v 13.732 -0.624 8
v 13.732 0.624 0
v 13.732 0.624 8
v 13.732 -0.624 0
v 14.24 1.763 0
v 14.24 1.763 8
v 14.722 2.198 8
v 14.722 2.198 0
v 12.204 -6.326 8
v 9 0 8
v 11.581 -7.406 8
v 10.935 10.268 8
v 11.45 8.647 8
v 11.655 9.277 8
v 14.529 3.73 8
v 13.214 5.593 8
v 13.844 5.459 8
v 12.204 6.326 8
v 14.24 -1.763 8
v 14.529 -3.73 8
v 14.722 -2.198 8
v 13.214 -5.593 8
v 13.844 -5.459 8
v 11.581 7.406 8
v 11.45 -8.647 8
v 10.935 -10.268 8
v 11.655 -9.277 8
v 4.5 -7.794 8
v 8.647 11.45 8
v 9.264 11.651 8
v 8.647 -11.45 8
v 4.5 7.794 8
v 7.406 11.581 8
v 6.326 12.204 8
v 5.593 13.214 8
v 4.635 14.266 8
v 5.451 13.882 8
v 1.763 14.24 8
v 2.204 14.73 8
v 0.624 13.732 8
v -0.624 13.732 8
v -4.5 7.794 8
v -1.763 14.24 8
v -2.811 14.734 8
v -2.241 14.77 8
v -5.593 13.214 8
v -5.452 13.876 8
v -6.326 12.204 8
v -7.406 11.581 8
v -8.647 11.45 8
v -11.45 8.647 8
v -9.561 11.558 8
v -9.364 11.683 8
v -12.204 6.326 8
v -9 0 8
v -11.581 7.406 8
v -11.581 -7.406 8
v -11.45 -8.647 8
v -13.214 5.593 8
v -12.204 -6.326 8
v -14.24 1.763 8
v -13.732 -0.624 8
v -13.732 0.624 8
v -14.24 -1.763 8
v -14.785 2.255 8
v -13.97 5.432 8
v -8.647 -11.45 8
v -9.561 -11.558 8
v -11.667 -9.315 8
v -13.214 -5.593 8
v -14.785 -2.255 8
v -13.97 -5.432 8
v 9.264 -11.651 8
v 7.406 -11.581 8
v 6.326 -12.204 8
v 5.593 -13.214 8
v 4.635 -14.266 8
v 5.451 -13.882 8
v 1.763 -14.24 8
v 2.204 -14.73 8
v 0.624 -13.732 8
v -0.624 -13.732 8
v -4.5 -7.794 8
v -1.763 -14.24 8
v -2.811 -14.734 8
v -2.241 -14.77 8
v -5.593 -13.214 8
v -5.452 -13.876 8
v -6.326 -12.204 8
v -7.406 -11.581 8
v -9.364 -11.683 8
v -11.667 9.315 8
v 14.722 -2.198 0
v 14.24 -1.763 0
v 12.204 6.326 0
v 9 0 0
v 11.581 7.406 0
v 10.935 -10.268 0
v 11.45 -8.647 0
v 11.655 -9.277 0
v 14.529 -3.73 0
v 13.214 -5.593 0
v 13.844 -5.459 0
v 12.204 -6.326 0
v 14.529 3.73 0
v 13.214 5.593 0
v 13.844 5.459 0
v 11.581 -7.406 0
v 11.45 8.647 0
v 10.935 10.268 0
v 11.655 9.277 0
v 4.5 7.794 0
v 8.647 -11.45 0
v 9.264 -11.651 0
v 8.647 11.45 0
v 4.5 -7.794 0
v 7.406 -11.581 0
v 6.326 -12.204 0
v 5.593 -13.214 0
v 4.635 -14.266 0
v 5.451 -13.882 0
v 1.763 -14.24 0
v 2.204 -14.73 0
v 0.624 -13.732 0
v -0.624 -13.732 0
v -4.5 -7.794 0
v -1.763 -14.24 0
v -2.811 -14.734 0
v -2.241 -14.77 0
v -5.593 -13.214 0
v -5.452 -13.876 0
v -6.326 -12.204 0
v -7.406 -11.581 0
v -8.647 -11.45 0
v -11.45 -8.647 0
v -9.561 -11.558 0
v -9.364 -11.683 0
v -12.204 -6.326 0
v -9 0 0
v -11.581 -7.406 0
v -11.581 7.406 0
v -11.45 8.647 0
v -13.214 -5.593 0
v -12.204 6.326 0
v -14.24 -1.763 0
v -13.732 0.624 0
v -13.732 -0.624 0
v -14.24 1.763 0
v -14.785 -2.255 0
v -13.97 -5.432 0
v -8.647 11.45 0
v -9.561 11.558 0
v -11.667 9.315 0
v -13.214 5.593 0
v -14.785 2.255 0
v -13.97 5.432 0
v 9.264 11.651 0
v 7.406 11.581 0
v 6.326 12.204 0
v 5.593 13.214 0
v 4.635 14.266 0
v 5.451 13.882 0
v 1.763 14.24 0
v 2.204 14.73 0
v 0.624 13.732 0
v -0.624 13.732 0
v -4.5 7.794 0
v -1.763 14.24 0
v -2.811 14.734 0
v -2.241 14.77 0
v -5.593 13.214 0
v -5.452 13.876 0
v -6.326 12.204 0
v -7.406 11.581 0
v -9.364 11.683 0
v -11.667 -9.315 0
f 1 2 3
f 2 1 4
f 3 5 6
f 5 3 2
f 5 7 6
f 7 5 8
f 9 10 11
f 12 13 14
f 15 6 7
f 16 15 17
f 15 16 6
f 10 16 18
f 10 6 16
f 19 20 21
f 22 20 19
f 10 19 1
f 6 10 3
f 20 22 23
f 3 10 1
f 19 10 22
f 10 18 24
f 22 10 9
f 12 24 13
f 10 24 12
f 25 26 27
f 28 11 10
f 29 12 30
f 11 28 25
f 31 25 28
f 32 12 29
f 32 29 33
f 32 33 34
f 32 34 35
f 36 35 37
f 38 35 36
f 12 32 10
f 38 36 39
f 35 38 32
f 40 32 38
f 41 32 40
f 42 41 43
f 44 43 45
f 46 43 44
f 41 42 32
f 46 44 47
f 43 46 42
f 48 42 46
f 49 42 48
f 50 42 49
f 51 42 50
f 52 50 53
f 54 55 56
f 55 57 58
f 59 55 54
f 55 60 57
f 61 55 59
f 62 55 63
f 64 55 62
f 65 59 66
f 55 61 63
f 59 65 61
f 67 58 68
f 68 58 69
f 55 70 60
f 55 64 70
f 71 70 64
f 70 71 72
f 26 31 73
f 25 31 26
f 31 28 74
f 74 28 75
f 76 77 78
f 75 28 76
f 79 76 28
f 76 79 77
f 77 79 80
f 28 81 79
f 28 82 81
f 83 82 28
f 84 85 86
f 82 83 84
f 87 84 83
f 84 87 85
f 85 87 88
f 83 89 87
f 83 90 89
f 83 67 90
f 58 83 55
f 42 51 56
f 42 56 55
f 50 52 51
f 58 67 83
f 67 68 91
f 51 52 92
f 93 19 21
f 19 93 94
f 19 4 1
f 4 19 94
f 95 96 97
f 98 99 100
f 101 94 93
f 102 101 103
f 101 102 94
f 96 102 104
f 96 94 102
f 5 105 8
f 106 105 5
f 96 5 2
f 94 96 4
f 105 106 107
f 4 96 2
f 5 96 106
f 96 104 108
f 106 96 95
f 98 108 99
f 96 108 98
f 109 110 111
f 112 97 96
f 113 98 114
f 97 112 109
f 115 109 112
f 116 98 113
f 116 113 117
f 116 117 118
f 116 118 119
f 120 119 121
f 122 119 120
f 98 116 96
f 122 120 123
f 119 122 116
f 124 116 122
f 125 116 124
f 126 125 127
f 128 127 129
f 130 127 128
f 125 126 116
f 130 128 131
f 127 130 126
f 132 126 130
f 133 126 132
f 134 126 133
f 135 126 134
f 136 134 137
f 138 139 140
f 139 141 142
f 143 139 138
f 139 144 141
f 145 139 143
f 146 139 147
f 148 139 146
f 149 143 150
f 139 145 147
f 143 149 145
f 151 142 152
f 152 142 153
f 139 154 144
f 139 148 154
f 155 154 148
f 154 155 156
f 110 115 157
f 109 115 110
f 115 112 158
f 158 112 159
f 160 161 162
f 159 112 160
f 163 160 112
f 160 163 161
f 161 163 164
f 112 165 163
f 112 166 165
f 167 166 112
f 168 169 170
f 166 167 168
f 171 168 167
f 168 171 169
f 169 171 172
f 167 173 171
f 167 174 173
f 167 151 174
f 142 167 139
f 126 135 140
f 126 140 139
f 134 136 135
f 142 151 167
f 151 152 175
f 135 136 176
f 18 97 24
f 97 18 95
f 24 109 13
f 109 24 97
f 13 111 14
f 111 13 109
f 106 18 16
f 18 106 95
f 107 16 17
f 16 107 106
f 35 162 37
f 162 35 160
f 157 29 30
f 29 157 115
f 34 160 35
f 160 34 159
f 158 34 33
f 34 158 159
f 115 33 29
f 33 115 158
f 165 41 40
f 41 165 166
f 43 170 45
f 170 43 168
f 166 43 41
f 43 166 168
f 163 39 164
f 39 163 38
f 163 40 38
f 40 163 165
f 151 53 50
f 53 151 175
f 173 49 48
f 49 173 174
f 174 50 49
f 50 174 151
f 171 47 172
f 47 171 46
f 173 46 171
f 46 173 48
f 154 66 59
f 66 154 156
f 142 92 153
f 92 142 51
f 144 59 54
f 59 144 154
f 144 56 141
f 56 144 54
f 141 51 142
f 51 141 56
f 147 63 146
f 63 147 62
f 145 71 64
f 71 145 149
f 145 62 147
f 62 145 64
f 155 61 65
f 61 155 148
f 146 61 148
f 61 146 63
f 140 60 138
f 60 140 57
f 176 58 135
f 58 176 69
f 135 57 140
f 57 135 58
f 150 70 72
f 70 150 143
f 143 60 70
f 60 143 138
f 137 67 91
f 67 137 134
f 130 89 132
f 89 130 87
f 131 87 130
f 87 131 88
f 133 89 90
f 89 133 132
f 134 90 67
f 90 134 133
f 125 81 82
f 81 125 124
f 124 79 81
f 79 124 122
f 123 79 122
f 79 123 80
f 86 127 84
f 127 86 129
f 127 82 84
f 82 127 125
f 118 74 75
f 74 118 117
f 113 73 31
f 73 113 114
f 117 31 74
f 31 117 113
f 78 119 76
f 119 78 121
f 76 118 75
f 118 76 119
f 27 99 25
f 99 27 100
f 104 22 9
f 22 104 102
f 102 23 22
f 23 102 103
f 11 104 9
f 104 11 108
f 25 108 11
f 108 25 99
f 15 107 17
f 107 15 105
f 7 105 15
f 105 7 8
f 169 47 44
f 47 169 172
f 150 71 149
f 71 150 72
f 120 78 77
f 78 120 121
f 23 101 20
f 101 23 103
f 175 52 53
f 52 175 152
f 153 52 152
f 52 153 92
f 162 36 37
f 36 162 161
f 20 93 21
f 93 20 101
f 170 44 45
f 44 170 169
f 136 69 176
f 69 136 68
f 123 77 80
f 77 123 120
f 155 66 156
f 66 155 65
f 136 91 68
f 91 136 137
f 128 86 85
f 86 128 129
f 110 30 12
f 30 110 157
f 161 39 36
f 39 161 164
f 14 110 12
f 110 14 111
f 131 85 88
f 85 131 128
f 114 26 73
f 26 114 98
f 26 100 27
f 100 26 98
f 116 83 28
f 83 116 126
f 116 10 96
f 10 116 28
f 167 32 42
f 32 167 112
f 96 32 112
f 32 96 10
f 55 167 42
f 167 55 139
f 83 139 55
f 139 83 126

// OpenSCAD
// Knurled hex nut holder
// Glyn Cowles Feb 2015

// Total diameter of knob
totd=30;
// Height of knob
height=8;
// Nut diameter (point to point not flat to flat)
nutd=18;
// Number of knurls
knurls=12;

difference() {
    cylinder(h=height,r=totd/2,$fn=25);
    cylinder(h=height,r=nutd/2,$fn=6);
    for (r=[0:360/knurls:360]) {
        rotate([0,0,r]) translate([totd/1.8,0,0]) cylinder(h=height,r=(totd/5)/2,$fn=15);
    }
}

